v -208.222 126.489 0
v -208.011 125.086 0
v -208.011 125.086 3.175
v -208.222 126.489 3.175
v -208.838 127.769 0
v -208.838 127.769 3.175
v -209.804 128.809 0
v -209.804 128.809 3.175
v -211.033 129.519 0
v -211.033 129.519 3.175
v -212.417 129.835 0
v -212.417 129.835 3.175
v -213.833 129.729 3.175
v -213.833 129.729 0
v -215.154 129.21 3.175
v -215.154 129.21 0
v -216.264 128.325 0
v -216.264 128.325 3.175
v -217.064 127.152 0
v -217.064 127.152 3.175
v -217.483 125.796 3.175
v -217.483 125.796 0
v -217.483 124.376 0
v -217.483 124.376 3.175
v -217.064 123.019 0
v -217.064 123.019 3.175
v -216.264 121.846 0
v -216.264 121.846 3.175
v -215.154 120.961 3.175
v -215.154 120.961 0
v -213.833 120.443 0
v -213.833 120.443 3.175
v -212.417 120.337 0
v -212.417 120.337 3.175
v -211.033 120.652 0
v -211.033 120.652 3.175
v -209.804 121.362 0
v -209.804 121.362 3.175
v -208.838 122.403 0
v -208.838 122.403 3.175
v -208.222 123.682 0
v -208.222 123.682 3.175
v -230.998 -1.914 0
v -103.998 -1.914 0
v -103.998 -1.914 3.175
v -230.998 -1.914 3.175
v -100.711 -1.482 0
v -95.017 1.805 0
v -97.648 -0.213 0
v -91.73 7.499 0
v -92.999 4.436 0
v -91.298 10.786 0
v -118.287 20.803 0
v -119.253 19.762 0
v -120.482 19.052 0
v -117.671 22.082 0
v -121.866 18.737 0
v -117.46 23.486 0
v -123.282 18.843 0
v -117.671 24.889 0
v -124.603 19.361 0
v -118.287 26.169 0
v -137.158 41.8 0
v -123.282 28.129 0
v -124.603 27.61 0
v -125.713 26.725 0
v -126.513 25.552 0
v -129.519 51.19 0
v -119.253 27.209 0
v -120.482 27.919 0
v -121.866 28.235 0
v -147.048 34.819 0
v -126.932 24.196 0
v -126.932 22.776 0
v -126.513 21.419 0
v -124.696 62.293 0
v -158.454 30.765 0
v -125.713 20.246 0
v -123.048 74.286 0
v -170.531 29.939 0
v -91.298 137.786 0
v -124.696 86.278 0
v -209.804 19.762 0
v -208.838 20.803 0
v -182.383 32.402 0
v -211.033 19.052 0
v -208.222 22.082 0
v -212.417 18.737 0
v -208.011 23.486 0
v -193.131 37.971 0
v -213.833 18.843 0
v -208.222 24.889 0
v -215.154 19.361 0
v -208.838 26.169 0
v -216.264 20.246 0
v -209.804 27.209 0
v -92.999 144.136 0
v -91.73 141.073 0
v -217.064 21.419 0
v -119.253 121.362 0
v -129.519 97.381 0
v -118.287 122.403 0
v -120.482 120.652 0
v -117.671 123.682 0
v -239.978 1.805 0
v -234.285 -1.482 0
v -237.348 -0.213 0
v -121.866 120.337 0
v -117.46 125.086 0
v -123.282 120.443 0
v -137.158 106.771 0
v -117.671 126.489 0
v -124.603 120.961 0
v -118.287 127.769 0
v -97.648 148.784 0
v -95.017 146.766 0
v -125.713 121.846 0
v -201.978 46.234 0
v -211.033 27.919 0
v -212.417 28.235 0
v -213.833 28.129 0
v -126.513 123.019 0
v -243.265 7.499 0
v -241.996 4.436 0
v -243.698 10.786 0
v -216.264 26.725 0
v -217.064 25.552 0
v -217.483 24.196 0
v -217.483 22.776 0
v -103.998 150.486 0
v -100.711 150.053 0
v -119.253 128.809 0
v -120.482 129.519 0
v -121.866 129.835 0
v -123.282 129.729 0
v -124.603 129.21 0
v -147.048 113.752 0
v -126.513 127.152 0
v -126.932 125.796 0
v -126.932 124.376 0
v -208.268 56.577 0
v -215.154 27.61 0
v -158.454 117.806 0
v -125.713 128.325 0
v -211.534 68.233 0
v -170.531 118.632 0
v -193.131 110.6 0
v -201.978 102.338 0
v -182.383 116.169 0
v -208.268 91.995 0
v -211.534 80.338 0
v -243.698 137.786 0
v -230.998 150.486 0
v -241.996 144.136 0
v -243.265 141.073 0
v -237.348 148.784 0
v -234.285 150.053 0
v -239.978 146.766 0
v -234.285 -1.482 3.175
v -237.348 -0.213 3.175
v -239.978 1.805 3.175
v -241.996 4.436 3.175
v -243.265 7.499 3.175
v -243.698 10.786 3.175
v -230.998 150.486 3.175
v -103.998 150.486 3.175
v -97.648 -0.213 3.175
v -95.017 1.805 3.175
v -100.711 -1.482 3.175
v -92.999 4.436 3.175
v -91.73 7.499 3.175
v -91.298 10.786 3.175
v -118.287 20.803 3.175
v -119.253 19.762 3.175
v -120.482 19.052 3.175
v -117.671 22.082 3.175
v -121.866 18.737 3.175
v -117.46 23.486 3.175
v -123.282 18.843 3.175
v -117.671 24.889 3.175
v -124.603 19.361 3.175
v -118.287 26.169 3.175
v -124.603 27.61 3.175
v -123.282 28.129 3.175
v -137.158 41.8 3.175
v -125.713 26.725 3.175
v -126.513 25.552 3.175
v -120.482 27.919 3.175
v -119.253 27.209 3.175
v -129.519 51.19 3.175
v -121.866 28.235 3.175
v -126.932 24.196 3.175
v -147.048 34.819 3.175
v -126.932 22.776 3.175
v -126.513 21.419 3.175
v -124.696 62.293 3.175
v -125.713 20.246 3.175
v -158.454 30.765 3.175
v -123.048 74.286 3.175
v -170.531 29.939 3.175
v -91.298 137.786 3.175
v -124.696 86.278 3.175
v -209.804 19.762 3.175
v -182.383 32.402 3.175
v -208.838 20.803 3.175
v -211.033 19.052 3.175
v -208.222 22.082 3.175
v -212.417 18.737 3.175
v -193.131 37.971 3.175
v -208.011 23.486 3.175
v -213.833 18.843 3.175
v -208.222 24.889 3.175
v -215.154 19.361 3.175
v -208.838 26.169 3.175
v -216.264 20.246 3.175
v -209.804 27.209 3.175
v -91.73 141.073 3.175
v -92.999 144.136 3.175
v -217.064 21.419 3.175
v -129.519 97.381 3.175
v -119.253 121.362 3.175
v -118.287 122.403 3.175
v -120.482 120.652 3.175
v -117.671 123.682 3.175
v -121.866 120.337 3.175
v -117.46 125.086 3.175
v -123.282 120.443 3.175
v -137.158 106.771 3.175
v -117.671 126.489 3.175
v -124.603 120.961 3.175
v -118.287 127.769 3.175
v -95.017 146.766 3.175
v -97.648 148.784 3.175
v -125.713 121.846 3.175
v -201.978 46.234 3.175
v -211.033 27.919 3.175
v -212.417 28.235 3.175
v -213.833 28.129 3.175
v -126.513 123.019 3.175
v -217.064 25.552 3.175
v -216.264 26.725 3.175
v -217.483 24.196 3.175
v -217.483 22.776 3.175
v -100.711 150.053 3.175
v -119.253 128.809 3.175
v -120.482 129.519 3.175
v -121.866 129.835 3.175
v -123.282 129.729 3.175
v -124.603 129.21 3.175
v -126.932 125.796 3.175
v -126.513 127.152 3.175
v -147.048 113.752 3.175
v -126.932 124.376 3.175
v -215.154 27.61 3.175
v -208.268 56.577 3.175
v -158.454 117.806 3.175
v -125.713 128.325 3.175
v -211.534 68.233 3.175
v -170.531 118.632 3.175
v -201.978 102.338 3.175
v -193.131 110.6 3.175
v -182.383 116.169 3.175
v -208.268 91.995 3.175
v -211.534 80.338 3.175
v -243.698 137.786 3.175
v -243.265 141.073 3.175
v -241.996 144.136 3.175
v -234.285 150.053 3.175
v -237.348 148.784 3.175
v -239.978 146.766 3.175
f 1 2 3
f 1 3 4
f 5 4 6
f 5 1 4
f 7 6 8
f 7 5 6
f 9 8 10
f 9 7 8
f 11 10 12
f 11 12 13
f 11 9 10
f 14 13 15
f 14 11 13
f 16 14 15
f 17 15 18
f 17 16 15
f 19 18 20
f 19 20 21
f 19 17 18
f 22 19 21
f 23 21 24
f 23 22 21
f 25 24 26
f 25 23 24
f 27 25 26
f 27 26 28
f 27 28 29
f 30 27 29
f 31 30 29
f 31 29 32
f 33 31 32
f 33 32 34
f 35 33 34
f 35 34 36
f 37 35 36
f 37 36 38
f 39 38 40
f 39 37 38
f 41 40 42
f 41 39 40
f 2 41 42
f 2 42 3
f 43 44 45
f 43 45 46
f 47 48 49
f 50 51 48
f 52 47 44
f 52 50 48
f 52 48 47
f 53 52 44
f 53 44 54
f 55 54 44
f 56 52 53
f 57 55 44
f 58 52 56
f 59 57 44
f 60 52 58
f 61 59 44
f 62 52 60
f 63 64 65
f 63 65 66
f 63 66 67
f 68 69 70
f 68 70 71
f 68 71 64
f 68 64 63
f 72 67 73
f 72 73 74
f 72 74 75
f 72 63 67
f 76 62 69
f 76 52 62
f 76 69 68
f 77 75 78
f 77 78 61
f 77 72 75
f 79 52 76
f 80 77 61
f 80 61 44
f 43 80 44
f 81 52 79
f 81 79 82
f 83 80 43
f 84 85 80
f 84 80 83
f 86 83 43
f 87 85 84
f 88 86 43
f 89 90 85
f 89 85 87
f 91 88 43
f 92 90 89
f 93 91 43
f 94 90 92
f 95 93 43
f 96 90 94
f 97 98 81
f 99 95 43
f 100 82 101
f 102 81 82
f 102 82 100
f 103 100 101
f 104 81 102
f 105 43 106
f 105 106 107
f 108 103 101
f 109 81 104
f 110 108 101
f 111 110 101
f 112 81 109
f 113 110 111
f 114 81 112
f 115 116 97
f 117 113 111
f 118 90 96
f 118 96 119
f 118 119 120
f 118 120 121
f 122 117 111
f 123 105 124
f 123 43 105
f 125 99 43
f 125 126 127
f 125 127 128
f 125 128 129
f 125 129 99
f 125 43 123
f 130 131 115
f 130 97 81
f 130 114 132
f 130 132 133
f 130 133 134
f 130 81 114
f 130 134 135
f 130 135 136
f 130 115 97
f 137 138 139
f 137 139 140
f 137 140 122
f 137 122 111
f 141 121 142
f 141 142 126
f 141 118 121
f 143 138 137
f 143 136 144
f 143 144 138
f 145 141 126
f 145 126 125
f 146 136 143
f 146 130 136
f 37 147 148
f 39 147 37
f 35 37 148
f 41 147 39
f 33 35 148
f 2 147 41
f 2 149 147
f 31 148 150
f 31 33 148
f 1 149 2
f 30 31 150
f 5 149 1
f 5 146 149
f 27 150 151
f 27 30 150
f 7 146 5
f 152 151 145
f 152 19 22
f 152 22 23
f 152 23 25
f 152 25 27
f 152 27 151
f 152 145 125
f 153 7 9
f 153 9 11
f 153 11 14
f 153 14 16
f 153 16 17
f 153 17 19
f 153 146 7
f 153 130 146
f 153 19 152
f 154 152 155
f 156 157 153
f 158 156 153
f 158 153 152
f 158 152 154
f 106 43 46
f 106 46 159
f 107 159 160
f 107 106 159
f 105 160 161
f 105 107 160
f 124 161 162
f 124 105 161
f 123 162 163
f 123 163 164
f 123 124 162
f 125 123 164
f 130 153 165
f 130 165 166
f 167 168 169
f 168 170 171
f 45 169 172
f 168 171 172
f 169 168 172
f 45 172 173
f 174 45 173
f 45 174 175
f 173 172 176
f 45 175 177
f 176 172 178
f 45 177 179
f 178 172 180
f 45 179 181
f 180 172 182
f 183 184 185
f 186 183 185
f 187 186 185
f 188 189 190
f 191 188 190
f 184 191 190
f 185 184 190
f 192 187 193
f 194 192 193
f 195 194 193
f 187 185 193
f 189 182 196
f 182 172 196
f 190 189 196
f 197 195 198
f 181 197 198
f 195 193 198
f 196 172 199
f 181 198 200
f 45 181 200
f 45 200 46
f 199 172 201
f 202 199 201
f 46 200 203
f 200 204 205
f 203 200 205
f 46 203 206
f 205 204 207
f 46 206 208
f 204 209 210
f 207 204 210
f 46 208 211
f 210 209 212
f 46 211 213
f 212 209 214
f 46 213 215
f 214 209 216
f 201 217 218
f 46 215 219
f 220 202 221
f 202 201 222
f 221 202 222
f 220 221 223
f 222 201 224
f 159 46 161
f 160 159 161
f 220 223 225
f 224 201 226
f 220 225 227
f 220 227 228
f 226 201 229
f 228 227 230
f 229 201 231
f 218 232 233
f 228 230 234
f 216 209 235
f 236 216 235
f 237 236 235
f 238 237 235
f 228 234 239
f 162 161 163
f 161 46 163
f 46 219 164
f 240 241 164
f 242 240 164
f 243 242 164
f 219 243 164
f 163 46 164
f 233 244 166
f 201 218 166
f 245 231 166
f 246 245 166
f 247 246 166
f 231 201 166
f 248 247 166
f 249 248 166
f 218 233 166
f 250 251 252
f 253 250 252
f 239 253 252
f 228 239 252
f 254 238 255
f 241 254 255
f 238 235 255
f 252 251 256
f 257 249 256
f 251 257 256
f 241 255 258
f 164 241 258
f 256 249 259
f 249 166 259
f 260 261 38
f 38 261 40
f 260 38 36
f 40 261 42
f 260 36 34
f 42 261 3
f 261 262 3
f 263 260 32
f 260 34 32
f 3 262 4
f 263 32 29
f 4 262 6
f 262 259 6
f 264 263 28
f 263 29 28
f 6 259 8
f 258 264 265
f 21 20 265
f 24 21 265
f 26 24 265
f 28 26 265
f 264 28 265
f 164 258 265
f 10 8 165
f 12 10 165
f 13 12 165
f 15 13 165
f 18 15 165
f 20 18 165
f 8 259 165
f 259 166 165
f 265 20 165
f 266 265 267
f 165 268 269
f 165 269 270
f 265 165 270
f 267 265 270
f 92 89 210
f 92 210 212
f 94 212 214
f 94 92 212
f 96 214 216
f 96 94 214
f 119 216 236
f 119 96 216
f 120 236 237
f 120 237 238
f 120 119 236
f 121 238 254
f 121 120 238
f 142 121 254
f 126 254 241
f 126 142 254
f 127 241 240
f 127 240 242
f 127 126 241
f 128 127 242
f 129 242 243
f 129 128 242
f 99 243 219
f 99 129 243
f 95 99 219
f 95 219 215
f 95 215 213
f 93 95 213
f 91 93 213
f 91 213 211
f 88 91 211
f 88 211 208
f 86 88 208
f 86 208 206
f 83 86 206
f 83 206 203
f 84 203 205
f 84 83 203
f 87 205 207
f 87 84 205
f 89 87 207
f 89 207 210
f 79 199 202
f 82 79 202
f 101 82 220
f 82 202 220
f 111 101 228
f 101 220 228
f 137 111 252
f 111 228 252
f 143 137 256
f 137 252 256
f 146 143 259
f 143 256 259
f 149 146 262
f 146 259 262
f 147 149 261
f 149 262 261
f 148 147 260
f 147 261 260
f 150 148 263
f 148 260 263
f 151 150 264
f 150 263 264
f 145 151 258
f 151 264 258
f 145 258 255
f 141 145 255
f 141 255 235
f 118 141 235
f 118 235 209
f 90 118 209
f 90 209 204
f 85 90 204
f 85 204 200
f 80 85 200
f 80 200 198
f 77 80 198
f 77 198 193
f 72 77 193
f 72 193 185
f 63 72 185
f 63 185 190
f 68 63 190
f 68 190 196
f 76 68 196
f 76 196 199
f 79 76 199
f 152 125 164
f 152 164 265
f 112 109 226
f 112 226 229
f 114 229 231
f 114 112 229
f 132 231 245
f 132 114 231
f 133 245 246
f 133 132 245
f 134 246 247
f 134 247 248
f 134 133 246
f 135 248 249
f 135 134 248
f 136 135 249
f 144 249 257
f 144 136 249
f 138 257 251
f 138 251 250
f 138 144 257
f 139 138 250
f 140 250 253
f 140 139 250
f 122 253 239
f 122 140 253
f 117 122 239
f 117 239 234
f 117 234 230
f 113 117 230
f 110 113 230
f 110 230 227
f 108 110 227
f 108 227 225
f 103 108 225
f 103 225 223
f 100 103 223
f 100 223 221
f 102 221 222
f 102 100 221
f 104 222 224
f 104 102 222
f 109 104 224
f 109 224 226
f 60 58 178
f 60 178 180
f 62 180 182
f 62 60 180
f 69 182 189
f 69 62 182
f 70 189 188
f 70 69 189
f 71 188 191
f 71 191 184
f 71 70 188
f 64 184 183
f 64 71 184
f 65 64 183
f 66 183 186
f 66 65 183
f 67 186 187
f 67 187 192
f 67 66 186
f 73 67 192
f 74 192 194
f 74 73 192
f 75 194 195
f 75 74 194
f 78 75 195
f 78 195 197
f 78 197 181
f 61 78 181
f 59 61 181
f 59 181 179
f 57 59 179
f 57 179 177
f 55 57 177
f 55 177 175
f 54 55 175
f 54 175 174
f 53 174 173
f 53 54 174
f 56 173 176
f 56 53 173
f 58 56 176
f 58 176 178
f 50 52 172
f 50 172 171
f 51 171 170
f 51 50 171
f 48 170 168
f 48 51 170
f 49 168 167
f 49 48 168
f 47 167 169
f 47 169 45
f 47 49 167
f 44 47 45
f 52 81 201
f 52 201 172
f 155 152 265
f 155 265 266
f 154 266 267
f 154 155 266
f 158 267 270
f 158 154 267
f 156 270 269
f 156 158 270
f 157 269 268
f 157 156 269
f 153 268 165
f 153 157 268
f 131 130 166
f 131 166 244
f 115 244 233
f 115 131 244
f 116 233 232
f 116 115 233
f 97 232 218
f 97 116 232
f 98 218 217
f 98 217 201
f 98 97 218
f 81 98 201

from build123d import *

# Parameters (mm, degrees)
SKETCH1_R           = 4.7625
BOSS_EXTRUDE1_DEPTH = 3.175
SKETCH2_R           = 44.45
CUT_EXTRUDE1_DEPTH  = 4.175


with BuildPart() as part:
    # Sketch1 → Boss-Extrude1 (new body)
    with BuildSketch(Plane.XY):
        with BuildLine():
            Line((-230.997719316, 150.485716341), (-103.997719316, 150.485716341))
            ThreePointArc((-103.997719316, 150.485716341), (-95.017463195, 146.765972462), (-91.297719316, 137.785716341))
            Line((-91.297719316, 137.785716341), (-91.297719316, 10.785716341))
            ThreePointArc((-91.297719316, 10.785716341), (-95.017463195, 1.80546022), (-103.997719316, -1.914283659))
            Line((-103.997719316, -1.914283659), (-230.997719316, -1.914283659))
            ThreePointArc((-230.997719316, -1.914283659), (-239.977975437, 1.80546022), (-243.697719316, 10.785716341))
            Line((-243.697719316, 10.785716341), (-243.697719316, 137.785716341))
            ThreePointArc((-243.697719316, 137.785716341), (-239.977975437, 146.765972462), (-230.997719316, 150.485716341))
        make_face()
        with Locations((-122.222219316, 125.085716341)):
            Circle(SKETCH1_R, mode=Mode.SUBTRACT)
        with Locations((-212.773219316, 125.085716341)):
            Circle(SKETCH1_R, mode=Mode.SUBTRACT)
        with Locations((-212.773219316, 23.485716341)):
            Circle(SKETCH1_R, mode=Mode.SUBTRACT)
        with Locations((-122.222219316, 23.485716341)):
            Circle(SKETCH1_R, mode=Mode.SUBTRACT)
    extrude(amount=BOSS_EXTRUDE1_DEPTH)

    # Sketch2 → Cut-Extrude1 (cut, through all)
    with BuildSketch(Plane.XY.offset(3.175)):
        with Locations((-167.497719316, 74.285716341)):
            Circle(SKETCH2_R)
    extrude(amount=-CUT_EXTRUDE1_DEPTH, mode=Mode.SUBTRACT)


solid = part.part
